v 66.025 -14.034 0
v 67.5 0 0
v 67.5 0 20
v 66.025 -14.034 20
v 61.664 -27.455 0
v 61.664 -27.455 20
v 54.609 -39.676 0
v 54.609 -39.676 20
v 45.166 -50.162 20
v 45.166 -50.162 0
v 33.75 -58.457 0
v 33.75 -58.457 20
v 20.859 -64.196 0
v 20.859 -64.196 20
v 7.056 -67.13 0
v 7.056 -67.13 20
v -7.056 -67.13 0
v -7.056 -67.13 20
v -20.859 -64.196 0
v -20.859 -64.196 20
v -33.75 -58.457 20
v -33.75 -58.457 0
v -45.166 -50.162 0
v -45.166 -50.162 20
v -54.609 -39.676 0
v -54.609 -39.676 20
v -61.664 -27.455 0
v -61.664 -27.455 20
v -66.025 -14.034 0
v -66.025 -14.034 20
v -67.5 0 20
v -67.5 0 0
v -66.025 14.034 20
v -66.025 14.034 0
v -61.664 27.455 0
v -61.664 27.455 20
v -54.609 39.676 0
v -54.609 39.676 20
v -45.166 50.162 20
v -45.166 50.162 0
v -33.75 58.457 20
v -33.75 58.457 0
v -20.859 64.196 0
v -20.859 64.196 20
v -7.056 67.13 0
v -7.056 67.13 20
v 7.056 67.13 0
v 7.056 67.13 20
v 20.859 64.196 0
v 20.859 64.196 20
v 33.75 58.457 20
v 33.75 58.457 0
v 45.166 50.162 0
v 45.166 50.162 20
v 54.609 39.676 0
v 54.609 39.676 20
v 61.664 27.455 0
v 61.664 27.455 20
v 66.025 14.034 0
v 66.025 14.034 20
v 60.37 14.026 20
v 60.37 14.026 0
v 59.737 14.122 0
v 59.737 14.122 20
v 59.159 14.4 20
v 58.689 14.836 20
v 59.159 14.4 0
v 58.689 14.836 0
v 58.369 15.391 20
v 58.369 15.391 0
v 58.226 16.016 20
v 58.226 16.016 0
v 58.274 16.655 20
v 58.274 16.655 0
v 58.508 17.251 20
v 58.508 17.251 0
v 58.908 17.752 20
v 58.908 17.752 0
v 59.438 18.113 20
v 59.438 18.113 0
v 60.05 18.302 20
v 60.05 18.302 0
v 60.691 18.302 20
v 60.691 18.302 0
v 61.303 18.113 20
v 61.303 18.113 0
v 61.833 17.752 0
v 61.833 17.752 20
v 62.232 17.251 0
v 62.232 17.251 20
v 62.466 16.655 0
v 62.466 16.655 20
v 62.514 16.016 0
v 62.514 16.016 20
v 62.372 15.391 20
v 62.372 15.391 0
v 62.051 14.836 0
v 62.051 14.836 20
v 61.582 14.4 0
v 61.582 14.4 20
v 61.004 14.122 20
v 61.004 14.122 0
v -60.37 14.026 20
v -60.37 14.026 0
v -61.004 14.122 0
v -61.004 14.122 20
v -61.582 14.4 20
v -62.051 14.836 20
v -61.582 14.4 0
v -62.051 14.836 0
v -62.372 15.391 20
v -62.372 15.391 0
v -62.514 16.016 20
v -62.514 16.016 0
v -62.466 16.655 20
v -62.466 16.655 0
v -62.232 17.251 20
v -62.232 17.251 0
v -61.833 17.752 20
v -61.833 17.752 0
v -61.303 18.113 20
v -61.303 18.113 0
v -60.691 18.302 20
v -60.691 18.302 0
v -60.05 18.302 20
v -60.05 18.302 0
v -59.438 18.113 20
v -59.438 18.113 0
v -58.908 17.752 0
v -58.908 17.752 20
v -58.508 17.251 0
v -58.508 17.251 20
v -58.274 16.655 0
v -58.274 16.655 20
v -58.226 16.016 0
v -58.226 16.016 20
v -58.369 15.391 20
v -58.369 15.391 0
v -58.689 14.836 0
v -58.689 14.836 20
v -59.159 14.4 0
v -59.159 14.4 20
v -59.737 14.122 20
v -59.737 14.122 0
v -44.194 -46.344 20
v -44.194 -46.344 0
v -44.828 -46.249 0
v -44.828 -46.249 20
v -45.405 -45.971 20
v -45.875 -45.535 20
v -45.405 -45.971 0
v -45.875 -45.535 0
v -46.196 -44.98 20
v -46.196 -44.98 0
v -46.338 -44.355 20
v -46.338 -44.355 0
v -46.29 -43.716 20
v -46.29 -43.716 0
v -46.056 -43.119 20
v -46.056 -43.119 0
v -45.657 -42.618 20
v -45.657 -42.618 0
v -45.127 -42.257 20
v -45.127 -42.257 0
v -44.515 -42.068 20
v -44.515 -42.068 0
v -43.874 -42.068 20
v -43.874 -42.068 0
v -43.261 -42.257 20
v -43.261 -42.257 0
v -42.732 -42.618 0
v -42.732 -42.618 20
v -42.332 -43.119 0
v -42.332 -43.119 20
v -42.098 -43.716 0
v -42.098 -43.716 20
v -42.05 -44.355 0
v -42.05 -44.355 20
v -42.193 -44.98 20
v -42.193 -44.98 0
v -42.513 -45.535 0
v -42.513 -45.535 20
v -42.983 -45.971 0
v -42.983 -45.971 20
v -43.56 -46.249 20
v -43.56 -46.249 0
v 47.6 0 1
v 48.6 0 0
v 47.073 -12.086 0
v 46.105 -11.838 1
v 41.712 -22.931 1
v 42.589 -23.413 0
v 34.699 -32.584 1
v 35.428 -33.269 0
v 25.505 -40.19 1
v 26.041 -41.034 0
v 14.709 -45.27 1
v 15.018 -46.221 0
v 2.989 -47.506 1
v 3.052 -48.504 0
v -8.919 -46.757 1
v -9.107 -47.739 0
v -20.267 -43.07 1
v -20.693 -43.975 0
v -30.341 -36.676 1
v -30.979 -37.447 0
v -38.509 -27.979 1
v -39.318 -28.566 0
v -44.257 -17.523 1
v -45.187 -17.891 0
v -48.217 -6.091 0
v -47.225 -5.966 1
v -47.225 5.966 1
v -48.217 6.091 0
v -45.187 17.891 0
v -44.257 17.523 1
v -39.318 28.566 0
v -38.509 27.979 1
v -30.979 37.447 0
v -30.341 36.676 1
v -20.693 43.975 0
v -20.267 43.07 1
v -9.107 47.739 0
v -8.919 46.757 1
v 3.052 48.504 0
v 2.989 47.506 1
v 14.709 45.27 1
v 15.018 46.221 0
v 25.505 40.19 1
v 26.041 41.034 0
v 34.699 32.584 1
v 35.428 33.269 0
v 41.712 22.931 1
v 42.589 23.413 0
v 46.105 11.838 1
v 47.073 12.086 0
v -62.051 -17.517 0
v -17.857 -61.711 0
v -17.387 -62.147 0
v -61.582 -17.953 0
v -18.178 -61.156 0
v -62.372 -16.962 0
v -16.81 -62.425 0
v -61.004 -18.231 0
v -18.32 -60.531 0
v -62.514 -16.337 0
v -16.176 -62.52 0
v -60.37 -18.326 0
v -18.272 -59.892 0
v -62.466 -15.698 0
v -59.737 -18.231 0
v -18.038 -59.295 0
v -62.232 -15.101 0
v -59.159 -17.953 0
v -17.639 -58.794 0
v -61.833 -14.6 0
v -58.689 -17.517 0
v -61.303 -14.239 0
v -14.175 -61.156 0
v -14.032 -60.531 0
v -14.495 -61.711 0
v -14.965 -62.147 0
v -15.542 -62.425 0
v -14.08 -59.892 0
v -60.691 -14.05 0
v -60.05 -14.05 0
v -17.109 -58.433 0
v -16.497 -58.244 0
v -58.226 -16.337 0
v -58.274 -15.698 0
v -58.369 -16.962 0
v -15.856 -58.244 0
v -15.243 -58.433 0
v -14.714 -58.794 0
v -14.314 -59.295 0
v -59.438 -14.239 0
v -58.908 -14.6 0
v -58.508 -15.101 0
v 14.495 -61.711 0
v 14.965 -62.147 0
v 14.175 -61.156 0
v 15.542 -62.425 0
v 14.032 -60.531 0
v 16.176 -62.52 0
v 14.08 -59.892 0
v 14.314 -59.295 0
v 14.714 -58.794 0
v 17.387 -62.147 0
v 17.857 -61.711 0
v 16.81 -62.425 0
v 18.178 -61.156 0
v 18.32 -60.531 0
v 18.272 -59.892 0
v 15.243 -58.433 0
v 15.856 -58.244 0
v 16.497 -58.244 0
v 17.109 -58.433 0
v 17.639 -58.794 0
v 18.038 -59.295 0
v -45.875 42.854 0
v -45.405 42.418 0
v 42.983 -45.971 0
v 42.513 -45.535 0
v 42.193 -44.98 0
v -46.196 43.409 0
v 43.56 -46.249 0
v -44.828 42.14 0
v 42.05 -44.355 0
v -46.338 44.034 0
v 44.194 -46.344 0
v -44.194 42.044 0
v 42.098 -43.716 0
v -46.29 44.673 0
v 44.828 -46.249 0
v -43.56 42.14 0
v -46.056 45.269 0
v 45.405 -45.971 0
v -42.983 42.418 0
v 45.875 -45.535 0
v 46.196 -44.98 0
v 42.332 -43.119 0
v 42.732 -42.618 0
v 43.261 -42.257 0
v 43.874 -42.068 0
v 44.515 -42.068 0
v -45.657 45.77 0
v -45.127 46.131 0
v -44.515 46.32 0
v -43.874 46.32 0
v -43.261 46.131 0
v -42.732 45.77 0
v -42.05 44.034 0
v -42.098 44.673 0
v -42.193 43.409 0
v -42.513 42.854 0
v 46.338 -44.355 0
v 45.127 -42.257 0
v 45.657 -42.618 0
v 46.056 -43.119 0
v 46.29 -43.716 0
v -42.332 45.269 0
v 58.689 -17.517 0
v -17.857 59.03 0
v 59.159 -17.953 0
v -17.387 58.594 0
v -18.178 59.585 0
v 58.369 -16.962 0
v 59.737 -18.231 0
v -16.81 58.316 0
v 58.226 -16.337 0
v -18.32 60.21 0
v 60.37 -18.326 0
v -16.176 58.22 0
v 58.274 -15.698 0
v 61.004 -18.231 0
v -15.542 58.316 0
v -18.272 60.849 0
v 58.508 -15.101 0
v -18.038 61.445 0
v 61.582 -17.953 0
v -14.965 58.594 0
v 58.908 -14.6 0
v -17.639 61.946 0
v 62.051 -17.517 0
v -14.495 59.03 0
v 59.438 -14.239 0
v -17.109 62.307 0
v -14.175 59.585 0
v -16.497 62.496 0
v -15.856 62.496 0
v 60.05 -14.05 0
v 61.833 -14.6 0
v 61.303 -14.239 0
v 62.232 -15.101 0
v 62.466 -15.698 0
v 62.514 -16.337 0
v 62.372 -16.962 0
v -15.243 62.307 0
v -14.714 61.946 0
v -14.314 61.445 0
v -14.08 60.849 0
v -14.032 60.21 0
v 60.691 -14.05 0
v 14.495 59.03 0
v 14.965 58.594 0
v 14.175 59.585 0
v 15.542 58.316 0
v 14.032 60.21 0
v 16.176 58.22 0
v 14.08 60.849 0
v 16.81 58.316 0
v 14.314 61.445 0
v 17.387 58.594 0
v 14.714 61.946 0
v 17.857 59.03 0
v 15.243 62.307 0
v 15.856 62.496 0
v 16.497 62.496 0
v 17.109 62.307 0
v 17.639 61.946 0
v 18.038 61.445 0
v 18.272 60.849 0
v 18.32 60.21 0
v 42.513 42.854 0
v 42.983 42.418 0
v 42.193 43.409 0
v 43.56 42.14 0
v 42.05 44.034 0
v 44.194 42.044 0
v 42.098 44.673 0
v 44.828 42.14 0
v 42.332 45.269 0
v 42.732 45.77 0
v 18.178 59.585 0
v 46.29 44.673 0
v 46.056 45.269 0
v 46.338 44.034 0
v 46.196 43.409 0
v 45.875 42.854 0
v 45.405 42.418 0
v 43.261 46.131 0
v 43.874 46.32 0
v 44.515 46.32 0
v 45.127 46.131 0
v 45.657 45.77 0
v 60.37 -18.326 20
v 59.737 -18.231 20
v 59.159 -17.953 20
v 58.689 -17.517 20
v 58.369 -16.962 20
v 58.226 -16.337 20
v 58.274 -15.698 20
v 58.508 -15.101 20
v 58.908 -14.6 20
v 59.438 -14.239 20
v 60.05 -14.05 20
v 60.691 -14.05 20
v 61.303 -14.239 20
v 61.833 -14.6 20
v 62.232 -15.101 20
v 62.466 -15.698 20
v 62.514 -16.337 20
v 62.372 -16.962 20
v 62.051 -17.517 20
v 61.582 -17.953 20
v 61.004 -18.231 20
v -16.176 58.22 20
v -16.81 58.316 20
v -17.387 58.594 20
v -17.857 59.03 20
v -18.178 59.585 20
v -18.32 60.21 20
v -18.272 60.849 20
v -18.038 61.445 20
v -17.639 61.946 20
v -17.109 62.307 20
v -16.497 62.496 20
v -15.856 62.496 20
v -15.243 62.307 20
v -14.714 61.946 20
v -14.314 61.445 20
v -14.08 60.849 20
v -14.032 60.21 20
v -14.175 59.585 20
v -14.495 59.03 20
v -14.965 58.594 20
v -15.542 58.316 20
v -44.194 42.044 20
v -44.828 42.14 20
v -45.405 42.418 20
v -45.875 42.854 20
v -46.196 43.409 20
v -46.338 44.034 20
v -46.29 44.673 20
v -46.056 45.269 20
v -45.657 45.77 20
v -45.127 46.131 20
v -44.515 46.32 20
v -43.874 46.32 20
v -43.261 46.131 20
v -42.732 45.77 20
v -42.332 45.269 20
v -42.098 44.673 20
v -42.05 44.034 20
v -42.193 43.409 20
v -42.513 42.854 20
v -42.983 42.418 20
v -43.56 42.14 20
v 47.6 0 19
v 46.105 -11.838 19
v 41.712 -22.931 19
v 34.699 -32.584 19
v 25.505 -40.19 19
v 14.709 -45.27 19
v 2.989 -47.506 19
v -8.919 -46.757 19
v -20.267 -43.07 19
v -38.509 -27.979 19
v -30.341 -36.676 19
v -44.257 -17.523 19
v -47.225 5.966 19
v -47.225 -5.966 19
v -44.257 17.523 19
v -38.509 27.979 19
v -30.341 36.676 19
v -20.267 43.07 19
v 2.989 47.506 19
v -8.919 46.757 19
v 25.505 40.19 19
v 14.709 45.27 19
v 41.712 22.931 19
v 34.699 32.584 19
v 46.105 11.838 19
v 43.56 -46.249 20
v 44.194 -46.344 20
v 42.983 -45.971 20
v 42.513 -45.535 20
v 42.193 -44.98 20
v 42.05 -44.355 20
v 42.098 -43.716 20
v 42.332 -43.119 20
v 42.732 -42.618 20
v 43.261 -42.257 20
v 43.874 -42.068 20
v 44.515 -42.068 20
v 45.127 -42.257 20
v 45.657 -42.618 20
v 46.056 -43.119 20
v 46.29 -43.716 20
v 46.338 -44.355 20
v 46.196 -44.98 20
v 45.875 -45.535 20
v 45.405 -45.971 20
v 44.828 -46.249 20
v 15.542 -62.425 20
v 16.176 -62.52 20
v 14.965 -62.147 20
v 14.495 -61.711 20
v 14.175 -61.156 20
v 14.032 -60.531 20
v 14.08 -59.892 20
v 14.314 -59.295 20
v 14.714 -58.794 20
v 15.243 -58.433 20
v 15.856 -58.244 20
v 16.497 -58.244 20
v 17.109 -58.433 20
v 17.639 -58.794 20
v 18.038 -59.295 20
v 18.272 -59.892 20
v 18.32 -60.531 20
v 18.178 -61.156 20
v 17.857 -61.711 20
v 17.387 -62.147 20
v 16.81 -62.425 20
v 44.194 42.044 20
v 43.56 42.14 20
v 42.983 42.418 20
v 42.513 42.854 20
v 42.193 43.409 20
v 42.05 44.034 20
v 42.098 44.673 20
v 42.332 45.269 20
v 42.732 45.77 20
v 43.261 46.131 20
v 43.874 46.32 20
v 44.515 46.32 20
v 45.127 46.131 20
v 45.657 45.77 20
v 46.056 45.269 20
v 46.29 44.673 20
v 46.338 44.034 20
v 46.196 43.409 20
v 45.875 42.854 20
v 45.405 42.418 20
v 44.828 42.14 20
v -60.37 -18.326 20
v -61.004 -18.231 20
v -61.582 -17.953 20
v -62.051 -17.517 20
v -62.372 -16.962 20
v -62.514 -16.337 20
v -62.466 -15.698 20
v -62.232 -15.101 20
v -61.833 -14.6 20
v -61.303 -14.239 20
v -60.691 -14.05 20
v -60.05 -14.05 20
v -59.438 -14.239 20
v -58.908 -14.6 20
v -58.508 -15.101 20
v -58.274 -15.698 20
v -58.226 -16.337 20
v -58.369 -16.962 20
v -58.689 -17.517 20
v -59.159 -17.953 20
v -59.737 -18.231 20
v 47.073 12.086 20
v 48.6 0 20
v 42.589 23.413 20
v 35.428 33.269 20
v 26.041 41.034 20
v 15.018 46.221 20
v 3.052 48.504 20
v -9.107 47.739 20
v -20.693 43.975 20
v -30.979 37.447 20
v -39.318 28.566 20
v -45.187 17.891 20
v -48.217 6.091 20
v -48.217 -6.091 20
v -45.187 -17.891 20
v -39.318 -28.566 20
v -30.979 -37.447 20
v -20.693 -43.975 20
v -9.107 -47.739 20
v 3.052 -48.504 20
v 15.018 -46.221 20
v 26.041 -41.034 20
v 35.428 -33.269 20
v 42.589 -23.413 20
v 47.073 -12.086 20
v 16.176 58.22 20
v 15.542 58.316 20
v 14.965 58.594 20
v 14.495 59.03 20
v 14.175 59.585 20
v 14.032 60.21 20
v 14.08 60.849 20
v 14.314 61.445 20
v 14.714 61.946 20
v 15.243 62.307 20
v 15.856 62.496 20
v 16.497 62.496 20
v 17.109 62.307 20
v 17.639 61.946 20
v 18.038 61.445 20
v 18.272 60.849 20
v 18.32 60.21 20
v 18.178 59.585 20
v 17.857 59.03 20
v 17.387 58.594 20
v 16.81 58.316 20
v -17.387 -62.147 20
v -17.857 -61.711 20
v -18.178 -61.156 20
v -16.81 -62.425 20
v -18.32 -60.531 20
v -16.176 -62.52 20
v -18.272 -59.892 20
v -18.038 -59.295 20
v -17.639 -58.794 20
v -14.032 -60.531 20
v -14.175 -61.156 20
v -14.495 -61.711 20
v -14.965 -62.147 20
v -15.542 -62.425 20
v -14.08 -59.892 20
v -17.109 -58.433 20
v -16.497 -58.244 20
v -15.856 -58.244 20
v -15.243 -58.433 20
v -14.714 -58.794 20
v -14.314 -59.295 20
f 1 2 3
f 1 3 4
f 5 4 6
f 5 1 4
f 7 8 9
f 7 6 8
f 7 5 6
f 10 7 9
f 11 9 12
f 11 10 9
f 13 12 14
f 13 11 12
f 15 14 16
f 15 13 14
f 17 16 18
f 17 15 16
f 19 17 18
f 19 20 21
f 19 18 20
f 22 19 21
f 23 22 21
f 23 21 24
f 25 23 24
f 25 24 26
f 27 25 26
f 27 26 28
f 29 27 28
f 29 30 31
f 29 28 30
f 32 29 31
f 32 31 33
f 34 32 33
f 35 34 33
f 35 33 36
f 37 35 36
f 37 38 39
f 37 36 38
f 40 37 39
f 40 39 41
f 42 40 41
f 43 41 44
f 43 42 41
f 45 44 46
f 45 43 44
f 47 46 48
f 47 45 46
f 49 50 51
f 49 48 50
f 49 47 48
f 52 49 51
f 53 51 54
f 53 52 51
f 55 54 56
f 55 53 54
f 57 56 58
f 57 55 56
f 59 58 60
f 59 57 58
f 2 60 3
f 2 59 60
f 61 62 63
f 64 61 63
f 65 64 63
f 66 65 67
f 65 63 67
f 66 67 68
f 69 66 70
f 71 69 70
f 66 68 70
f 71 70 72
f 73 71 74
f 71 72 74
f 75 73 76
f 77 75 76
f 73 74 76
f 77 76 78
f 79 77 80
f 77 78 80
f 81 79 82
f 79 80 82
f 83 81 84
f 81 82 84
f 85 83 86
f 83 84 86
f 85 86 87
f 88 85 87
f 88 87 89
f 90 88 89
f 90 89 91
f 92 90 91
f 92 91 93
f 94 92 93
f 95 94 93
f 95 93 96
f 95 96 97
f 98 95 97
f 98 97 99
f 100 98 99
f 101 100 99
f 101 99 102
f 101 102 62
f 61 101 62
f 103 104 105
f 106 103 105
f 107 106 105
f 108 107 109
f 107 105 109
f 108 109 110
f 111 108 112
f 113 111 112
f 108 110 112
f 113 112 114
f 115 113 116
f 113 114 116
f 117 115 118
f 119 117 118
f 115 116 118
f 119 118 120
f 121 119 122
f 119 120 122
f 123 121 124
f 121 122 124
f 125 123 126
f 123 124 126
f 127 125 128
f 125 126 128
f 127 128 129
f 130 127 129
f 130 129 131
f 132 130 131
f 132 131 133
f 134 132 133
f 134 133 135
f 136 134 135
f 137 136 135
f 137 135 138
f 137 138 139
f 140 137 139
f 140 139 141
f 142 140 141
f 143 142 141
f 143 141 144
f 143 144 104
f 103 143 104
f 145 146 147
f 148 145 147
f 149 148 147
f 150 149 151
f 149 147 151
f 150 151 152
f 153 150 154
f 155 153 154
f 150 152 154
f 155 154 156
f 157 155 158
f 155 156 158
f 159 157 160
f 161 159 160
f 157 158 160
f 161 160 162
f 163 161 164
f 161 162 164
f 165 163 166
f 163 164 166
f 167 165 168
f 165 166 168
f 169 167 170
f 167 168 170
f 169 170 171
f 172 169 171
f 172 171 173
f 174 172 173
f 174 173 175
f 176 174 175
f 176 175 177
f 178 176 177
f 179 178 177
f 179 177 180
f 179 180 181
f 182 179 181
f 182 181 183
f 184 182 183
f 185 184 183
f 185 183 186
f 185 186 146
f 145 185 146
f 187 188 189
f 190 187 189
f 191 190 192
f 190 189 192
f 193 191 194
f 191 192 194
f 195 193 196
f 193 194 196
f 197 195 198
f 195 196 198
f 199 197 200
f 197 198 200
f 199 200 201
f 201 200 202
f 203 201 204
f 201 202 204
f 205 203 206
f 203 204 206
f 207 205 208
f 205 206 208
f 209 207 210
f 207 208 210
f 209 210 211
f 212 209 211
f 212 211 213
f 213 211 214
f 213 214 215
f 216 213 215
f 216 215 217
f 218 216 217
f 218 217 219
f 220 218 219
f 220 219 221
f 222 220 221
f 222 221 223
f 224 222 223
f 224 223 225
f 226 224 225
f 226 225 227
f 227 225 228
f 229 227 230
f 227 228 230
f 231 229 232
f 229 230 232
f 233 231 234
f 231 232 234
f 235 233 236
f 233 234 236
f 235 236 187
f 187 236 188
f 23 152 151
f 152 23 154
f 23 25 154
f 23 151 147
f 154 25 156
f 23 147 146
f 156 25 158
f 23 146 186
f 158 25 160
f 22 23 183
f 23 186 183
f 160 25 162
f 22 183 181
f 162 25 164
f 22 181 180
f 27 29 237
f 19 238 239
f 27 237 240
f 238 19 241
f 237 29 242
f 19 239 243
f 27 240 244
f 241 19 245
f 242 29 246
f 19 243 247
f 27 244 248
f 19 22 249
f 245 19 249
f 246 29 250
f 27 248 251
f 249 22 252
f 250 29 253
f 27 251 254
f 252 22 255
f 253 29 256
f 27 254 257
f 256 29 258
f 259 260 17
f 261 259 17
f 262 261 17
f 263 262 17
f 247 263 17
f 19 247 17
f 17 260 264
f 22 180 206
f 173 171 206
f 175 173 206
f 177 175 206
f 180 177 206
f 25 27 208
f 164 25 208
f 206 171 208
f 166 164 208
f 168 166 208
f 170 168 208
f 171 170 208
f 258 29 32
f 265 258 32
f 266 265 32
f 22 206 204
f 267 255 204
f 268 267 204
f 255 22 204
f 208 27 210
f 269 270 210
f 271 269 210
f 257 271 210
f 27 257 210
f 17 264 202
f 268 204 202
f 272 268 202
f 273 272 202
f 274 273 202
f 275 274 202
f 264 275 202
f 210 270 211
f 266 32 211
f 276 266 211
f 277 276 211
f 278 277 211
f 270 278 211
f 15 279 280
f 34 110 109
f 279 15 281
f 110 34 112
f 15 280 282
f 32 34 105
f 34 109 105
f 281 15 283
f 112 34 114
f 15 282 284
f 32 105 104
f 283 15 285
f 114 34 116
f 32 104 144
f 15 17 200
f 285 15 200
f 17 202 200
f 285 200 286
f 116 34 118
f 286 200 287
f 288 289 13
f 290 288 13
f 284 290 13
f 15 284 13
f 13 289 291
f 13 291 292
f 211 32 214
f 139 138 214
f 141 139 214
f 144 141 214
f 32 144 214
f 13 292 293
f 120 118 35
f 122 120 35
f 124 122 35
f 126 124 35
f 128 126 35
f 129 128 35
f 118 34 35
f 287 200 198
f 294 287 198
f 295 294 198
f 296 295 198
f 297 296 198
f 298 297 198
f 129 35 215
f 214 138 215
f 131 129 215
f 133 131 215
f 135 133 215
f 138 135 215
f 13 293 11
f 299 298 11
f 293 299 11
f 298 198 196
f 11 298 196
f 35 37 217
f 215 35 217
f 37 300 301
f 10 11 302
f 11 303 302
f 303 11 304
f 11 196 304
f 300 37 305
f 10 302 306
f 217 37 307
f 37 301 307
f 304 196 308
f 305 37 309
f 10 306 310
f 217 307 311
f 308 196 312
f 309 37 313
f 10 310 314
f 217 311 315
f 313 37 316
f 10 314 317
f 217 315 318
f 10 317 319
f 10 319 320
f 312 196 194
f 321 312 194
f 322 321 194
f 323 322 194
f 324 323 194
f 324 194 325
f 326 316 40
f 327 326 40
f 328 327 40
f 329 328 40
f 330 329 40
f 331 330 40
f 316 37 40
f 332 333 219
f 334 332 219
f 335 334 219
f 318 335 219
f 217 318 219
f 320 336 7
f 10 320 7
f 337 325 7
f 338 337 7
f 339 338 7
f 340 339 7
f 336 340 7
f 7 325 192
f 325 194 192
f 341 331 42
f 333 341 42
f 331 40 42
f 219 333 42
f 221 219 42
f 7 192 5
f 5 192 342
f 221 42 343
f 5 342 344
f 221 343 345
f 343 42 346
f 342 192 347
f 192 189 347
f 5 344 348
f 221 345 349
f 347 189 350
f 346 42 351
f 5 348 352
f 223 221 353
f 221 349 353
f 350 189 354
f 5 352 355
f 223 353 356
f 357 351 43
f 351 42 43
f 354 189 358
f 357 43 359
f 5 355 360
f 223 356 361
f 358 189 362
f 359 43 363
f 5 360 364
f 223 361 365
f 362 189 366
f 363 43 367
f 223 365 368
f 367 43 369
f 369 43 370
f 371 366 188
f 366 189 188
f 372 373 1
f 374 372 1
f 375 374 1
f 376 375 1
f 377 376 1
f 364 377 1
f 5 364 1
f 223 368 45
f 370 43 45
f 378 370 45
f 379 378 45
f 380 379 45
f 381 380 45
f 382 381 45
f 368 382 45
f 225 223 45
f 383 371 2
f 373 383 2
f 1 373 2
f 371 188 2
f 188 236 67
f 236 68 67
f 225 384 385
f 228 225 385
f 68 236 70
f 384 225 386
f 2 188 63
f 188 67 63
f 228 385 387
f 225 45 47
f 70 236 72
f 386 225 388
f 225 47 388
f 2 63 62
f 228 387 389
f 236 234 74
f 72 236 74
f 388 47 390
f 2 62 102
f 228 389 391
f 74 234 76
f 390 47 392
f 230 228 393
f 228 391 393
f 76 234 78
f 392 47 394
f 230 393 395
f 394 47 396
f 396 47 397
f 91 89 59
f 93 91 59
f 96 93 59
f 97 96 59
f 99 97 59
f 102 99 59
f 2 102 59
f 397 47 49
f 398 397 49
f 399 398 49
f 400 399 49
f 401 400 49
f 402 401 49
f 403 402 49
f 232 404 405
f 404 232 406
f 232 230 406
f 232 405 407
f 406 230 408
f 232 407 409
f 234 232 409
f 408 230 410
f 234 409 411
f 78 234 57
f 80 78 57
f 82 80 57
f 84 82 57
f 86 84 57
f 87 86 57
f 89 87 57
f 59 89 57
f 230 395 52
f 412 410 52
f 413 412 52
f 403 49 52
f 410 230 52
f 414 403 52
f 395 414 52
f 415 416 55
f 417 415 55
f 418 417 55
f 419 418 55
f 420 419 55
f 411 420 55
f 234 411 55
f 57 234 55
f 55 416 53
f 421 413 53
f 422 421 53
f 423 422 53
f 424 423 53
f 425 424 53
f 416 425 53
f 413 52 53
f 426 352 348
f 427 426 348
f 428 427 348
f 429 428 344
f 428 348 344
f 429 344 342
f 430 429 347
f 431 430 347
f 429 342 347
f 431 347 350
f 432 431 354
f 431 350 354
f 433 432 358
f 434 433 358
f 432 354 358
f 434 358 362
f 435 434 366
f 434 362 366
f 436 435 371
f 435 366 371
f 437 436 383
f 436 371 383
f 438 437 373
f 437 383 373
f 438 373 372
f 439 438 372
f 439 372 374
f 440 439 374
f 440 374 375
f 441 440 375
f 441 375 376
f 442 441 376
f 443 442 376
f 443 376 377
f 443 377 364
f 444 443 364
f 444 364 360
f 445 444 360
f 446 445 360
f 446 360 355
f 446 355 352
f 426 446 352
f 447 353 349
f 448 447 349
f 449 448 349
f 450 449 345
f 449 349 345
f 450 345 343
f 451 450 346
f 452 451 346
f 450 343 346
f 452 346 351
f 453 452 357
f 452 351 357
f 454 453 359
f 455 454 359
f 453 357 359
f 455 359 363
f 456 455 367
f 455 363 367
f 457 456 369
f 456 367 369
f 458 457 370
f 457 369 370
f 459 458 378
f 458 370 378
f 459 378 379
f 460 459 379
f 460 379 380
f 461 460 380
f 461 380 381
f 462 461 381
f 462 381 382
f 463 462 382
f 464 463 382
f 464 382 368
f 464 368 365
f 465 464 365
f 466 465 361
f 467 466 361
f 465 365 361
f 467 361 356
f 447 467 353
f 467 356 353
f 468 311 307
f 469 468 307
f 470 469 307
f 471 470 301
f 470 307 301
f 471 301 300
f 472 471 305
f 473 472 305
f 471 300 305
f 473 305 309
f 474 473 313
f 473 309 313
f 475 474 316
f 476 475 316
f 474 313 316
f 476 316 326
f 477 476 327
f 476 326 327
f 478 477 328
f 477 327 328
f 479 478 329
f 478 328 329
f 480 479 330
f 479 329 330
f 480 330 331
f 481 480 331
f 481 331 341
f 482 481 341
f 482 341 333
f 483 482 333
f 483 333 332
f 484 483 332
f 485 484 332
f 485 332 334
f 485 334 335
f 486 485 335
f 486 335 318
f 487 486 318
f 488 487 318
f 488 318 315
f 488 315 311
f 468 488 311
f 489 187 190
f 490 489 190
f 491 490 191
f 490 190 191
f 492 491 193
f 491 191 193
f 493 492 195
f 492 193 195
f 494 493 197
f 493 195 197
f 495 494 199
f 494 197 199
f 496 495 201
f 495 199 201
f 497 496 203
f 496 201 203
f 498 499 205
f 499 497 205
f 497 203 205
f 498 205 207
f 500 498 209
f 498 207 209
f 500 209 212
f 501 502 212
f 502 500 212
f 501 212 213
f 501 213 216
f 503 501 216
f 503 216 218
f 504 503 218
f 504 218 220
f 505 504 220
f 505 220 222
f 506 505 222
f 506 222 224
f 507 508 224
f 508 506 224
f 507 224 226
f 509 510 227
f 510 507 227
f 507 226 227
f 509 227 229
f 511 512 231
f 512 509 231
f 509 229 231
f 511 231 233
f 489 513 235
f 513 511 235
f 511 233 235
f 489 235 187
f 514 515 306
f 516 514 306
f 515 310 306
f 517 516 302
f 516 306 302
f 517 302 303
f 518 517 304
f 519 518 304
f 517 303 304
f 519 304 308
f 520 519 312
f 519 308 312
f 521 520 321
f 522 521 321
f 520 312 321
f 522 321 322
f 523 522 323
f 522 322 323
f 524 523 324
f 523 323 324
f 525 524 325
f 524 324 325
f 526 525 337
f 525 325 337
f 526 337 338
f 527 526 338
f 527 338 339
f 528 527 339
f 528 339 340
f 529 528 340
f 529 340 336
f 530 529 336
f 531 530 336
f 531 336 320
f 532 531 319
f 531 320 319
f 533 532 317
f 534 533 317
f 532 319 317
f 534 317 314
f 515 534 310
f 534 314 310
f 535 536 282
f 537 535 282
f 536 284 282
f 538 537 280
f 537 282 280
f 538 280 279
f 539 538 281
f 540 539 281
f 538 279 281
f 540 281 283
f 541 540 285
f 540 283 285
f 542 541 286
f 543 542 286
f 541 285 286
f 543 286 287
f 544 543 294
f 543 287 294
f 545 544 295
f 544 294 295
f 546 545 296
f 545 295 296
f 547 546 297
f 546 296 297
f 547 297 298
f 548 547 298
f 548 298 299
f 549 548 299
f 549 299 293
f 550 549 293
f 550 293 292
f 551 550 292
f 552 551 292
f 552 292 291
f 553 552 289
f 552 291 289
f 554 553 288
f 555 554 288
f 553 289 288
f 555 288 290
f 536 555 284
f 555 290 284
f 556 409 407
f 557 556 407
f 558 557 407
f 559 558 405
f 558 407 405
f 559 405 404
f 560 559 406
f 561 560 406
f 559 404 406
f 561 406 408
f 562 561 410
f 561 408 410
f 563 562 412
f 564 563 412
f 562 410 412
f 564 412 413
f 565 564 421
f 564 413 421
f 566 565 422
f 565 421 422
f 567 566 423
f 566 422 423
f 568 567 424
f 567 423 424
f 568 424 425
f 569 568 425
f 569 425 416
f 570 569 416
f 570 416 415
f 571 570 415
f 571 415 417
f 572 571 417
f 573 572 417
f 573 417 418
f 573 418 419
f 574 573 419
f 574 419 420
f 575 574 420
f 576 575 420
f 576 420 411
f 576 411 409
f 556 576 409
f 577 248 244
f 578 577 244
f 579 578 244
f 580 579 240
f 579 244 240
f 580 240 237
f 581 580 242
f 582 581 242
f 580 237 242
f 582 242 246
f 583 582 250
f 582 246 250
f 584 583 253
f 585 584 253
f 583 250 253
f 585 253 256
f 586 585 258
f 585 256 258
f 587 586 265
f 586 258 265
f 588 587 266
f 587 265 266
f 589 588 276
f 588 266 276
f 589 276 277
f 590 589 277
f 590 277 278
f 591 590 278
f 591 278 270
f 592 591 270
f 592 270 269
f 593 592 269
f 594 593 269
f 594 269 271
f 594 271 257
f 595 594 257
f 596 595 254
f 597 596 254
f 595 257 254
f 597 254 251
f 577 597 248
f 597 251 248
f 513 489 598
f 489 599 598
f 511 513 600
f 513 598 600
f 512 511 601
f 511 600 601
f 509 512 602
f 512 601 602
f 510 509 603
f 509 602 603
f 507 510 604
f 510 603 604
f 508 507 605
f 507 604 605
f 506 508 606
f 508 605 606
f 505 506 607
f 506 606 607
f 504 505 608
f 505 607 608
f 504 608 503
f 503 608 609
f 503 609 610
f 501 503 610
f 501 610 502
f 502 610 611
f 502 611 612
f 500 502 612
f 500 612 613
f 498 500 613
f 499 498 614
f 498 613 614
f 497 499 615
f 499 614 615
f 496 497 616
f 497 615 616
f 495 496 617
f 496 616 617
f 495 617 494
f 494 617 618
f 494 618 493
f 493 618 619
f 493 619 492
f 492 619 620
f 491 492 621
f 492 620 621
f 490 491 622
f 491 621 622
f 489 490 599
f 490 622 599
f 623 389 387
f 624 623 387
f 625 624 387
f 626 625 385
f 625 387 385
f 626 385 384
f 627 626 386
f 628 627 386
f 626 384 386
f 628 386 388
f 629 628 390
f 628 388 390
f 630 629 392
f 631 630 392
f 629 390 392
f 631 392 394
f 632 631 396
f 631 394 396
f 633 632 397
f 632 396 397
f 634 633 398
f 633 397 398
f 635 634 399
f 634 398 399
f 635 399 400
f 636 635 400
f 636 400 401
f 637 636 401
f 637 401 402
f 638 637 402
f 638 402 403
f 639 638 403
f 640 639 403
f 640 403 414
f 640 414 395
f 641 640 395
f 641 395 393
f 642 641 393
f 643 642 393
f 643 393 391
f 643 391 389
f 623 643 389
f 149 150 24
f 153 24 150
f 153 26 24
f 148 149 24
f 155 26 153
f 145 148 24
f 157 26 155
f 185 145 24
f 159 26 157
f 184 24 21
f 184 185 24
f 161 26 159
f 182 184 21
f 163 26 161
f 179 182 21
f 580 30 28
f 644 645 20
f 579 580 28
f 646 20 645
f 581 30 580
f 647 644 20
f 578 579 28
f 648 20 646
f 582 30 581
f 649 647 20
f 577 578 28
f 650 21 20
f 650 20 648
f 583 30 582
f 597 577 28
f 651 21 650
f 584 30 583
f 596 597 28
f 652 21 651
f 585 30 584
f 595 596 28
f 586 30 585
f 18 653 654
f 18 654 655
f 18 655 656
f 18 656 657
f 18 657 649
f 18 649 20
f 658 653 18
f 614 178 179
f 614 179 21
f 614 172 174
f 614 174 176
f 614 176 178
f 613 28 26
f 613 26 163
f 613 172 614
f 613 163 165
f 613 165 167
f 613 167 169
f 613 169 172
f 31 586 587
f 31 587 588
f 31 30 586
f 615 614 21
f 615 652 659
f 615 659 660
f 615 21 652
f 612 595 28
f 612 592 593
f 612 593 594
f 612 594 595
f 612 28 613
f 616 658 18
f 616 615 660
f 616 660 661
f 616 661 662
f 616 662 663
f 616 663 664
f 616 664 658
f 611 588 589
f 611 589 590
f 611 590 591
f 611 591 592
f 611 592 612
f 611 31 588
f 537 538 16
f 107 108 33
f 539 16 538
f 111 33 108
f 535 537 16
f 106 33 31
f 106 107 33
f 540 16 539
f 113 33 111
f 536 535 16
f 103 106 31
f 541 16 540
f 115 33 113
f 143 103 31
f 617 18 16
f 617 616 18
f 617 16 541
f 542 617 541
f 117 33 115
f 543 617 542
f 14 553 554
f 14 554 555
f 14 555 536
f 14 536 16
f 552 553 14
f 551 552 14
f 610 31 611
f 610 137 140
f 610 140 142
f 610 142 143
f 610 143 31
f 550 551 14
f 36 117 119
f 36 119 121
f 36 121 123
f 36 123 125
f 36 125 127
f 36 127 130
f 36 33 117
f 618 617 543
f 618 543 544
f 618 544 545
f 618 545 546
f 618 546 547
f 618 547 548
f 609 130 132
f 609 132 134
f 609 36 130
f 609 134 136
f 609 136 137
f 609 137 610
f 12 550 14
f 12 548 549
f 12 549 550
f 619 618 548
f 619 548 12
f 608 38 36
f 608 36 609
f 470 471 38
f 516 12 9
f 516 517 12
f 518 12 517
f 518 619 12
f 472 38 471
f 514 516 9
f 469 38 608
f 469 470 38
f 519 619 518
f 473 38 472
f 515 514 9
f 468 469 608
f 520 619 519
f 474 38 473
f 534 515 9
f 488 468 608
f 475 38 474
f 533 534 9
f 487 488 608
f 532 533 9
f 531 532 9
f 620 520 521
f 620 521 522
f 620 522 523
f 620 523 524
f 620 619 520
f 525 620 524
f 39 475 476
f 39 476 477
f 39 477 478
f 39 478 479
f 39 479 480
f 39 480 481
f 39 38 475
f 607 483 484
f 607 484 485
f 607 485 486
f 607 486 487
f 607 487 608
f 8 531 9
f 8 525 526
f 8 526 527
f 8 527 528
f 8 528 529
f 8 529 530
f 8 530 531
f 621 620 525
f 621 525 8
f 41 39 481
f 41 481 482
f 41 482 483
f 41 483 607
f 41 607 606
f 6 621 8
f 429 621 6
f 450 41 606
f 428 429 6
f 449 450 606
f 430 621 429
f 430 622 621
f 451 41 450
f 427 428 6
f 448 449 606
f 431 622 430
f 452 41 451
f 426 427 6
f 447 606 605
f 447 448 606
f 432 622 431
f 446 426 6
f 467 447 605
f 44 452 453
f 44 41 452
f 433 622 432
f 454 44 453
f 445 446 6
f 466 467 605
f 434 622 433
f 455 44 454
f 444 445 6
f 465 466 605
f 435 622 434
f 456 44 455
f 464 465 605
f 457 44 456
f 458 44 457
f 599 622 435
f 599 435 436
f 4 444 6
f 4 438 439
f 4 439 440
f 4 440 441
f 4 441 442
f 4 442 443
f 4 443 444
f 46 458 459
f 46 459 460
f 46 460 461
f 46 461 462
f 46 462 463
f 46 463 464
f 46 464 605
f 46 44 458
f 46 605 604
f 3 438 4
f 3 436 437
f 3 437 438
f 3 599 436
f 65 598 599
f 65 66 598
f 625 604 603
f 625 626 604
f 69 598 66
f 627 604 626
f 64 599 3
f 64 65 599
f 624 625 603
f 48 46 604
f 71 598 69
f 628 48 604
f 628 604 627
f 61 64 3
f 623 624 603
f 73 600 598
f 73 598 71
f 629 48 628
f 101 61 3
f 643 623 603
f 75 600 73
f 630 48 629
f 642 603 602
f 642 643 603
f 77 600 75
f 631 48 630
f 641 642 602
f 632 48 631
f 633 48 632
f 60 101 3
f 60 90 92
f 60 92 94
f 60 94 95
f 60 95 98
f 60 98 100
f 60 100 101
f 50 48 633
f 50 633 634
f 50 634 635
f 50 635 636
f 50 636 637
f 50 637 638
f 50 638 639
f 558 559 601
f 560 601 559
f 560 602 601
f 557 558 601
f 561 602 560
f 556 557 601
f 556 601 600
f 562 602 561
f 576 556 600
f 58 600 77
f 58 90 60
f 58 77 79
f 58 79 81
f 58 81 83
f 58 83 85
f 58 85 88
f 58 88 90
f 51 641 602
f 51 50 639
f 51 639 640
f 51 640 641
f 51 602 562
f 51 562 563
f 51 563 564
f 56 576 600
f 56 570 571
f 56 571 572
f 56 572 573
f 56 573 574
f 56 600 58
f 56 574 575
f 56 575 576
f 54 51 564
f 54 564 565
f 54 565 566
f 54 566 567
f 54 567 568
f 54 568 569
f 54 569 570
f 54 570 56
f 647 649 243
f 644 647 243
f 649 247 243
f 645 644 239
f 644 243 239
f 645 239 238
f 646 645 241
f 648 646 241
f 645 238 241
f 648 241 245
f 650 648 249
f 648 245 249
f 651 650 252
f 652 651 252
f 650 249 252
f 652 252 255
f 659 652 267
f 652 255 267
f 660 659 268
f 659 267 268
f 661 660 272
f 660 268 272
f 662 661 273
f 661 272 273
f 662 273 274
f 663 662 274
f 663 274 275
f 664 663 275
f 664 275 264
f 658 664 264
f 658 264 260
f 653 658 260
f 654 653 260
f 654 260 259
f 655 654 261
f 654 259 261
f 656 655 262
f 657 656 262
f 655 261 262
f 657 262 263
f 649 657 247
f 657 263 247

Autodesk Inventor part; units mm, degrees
ref_plane "YZ Plane" through (0, 0, 0) normal (1, 0, 0) x (0, 1, 0)
ref_plane "XZ Plane" through (0, 0, 0) normal (0, 1, 0) x (-1, 0, 0)
ref_plane "XY Plane" through (0, 0, 0) normal (0, 0, 1) x (1, 0, 0)
sketch "スケッチ1" plane through (0, 0, 0) normal (0, 0, 1) x (1, 0, 0)
  circle A0 centre (0, 0) radius 47.6
  circle A1 centre (0, 0) radius 67.5
  dimension "d0" = 95.2
  dimension "d1" = 135
extrude "押し出し1" add sketch "スケッチ1" along normal blind 20
sketch "スケッチ2" plane through (0, 0, 20) normal (0, 0, 1) x (1, 0, 0)
  circle A0 centre (0, 0) radius 62.5
  point P0 (16.1762, 60.3704)
  point P1 (-16.1762, 60.3704)
  point P2 (-44.1942, 44.1942)
  point P3 (-60.3704, 16.1762)
  point P4 (-60.3704, -16.1762)
  point P5 (-44.1942, -44.1942)
  point P6 (-16.1762, -60.3704)
  point P7 (16.1762, -60.3704)
  point P8 (44.1942, -44.1942)
  point P9 (60.3704, -16.1762)
  point P10 (60.3704, 16.1762)
  point P11 (44.1942, 44.1942)
  dimension "d4" = 125
  dimension "d7" = 360
  dimension "d25" = 0
hole "穴1" at (16.1762, 60.3704, 20) at (-16.1762, 60.3704, 20) at (-44.1942, 44.1942, 20) at (-60.3704, 16.1762, 20) at (-60.3704, -16.1762, 20) at (-44.1942, -44.1942, 20) at (-16.1762, -60.3704, 20) at (16.1762, -60.3704, 20) at (44.1942, -44.1942, 20) at (60.3704, -16.1762, 20) at (60.3704, 16.1762, 20) at (44.1942, 44.1942, 20) direction (0, 0, -1) diameter 4.3 end through all clearance for "Flat Head Machine Screw" size "M4" standard "Ansi Metric M Profile"
chamfer "面取り1" distance 1 angle 45 2 edges at (-47.6, 0, 20) (-47.6, 0, 0)
sketch "スケッチ3" plane through (0, 0, 20) normal (0, 0, 1) x (1, 0, 0)
  circle A0 centre (16.1762, 60.3704) radius 2.15 projected
  circle A1 centre (-16.1762, 60.3704) radius 2.15 projected
  circle A2 centre (0, 0) radius 67.5 projected
  circle A3 centre (-16.1762, 60.3704) radius 5
  circle A4 centre (16.1762, 60.3704) radius 5
  circle A5 centre (0, 0) radius 62.5
  point P0 (-11.2987, 61.4702)
  point P1 (11.2987, 61.4702)
  point P2 (17.4703, 65.2)
  point P3 (-17.4703, 65.2)
properties part number "unit-base3" material "ABS プラスチック"
